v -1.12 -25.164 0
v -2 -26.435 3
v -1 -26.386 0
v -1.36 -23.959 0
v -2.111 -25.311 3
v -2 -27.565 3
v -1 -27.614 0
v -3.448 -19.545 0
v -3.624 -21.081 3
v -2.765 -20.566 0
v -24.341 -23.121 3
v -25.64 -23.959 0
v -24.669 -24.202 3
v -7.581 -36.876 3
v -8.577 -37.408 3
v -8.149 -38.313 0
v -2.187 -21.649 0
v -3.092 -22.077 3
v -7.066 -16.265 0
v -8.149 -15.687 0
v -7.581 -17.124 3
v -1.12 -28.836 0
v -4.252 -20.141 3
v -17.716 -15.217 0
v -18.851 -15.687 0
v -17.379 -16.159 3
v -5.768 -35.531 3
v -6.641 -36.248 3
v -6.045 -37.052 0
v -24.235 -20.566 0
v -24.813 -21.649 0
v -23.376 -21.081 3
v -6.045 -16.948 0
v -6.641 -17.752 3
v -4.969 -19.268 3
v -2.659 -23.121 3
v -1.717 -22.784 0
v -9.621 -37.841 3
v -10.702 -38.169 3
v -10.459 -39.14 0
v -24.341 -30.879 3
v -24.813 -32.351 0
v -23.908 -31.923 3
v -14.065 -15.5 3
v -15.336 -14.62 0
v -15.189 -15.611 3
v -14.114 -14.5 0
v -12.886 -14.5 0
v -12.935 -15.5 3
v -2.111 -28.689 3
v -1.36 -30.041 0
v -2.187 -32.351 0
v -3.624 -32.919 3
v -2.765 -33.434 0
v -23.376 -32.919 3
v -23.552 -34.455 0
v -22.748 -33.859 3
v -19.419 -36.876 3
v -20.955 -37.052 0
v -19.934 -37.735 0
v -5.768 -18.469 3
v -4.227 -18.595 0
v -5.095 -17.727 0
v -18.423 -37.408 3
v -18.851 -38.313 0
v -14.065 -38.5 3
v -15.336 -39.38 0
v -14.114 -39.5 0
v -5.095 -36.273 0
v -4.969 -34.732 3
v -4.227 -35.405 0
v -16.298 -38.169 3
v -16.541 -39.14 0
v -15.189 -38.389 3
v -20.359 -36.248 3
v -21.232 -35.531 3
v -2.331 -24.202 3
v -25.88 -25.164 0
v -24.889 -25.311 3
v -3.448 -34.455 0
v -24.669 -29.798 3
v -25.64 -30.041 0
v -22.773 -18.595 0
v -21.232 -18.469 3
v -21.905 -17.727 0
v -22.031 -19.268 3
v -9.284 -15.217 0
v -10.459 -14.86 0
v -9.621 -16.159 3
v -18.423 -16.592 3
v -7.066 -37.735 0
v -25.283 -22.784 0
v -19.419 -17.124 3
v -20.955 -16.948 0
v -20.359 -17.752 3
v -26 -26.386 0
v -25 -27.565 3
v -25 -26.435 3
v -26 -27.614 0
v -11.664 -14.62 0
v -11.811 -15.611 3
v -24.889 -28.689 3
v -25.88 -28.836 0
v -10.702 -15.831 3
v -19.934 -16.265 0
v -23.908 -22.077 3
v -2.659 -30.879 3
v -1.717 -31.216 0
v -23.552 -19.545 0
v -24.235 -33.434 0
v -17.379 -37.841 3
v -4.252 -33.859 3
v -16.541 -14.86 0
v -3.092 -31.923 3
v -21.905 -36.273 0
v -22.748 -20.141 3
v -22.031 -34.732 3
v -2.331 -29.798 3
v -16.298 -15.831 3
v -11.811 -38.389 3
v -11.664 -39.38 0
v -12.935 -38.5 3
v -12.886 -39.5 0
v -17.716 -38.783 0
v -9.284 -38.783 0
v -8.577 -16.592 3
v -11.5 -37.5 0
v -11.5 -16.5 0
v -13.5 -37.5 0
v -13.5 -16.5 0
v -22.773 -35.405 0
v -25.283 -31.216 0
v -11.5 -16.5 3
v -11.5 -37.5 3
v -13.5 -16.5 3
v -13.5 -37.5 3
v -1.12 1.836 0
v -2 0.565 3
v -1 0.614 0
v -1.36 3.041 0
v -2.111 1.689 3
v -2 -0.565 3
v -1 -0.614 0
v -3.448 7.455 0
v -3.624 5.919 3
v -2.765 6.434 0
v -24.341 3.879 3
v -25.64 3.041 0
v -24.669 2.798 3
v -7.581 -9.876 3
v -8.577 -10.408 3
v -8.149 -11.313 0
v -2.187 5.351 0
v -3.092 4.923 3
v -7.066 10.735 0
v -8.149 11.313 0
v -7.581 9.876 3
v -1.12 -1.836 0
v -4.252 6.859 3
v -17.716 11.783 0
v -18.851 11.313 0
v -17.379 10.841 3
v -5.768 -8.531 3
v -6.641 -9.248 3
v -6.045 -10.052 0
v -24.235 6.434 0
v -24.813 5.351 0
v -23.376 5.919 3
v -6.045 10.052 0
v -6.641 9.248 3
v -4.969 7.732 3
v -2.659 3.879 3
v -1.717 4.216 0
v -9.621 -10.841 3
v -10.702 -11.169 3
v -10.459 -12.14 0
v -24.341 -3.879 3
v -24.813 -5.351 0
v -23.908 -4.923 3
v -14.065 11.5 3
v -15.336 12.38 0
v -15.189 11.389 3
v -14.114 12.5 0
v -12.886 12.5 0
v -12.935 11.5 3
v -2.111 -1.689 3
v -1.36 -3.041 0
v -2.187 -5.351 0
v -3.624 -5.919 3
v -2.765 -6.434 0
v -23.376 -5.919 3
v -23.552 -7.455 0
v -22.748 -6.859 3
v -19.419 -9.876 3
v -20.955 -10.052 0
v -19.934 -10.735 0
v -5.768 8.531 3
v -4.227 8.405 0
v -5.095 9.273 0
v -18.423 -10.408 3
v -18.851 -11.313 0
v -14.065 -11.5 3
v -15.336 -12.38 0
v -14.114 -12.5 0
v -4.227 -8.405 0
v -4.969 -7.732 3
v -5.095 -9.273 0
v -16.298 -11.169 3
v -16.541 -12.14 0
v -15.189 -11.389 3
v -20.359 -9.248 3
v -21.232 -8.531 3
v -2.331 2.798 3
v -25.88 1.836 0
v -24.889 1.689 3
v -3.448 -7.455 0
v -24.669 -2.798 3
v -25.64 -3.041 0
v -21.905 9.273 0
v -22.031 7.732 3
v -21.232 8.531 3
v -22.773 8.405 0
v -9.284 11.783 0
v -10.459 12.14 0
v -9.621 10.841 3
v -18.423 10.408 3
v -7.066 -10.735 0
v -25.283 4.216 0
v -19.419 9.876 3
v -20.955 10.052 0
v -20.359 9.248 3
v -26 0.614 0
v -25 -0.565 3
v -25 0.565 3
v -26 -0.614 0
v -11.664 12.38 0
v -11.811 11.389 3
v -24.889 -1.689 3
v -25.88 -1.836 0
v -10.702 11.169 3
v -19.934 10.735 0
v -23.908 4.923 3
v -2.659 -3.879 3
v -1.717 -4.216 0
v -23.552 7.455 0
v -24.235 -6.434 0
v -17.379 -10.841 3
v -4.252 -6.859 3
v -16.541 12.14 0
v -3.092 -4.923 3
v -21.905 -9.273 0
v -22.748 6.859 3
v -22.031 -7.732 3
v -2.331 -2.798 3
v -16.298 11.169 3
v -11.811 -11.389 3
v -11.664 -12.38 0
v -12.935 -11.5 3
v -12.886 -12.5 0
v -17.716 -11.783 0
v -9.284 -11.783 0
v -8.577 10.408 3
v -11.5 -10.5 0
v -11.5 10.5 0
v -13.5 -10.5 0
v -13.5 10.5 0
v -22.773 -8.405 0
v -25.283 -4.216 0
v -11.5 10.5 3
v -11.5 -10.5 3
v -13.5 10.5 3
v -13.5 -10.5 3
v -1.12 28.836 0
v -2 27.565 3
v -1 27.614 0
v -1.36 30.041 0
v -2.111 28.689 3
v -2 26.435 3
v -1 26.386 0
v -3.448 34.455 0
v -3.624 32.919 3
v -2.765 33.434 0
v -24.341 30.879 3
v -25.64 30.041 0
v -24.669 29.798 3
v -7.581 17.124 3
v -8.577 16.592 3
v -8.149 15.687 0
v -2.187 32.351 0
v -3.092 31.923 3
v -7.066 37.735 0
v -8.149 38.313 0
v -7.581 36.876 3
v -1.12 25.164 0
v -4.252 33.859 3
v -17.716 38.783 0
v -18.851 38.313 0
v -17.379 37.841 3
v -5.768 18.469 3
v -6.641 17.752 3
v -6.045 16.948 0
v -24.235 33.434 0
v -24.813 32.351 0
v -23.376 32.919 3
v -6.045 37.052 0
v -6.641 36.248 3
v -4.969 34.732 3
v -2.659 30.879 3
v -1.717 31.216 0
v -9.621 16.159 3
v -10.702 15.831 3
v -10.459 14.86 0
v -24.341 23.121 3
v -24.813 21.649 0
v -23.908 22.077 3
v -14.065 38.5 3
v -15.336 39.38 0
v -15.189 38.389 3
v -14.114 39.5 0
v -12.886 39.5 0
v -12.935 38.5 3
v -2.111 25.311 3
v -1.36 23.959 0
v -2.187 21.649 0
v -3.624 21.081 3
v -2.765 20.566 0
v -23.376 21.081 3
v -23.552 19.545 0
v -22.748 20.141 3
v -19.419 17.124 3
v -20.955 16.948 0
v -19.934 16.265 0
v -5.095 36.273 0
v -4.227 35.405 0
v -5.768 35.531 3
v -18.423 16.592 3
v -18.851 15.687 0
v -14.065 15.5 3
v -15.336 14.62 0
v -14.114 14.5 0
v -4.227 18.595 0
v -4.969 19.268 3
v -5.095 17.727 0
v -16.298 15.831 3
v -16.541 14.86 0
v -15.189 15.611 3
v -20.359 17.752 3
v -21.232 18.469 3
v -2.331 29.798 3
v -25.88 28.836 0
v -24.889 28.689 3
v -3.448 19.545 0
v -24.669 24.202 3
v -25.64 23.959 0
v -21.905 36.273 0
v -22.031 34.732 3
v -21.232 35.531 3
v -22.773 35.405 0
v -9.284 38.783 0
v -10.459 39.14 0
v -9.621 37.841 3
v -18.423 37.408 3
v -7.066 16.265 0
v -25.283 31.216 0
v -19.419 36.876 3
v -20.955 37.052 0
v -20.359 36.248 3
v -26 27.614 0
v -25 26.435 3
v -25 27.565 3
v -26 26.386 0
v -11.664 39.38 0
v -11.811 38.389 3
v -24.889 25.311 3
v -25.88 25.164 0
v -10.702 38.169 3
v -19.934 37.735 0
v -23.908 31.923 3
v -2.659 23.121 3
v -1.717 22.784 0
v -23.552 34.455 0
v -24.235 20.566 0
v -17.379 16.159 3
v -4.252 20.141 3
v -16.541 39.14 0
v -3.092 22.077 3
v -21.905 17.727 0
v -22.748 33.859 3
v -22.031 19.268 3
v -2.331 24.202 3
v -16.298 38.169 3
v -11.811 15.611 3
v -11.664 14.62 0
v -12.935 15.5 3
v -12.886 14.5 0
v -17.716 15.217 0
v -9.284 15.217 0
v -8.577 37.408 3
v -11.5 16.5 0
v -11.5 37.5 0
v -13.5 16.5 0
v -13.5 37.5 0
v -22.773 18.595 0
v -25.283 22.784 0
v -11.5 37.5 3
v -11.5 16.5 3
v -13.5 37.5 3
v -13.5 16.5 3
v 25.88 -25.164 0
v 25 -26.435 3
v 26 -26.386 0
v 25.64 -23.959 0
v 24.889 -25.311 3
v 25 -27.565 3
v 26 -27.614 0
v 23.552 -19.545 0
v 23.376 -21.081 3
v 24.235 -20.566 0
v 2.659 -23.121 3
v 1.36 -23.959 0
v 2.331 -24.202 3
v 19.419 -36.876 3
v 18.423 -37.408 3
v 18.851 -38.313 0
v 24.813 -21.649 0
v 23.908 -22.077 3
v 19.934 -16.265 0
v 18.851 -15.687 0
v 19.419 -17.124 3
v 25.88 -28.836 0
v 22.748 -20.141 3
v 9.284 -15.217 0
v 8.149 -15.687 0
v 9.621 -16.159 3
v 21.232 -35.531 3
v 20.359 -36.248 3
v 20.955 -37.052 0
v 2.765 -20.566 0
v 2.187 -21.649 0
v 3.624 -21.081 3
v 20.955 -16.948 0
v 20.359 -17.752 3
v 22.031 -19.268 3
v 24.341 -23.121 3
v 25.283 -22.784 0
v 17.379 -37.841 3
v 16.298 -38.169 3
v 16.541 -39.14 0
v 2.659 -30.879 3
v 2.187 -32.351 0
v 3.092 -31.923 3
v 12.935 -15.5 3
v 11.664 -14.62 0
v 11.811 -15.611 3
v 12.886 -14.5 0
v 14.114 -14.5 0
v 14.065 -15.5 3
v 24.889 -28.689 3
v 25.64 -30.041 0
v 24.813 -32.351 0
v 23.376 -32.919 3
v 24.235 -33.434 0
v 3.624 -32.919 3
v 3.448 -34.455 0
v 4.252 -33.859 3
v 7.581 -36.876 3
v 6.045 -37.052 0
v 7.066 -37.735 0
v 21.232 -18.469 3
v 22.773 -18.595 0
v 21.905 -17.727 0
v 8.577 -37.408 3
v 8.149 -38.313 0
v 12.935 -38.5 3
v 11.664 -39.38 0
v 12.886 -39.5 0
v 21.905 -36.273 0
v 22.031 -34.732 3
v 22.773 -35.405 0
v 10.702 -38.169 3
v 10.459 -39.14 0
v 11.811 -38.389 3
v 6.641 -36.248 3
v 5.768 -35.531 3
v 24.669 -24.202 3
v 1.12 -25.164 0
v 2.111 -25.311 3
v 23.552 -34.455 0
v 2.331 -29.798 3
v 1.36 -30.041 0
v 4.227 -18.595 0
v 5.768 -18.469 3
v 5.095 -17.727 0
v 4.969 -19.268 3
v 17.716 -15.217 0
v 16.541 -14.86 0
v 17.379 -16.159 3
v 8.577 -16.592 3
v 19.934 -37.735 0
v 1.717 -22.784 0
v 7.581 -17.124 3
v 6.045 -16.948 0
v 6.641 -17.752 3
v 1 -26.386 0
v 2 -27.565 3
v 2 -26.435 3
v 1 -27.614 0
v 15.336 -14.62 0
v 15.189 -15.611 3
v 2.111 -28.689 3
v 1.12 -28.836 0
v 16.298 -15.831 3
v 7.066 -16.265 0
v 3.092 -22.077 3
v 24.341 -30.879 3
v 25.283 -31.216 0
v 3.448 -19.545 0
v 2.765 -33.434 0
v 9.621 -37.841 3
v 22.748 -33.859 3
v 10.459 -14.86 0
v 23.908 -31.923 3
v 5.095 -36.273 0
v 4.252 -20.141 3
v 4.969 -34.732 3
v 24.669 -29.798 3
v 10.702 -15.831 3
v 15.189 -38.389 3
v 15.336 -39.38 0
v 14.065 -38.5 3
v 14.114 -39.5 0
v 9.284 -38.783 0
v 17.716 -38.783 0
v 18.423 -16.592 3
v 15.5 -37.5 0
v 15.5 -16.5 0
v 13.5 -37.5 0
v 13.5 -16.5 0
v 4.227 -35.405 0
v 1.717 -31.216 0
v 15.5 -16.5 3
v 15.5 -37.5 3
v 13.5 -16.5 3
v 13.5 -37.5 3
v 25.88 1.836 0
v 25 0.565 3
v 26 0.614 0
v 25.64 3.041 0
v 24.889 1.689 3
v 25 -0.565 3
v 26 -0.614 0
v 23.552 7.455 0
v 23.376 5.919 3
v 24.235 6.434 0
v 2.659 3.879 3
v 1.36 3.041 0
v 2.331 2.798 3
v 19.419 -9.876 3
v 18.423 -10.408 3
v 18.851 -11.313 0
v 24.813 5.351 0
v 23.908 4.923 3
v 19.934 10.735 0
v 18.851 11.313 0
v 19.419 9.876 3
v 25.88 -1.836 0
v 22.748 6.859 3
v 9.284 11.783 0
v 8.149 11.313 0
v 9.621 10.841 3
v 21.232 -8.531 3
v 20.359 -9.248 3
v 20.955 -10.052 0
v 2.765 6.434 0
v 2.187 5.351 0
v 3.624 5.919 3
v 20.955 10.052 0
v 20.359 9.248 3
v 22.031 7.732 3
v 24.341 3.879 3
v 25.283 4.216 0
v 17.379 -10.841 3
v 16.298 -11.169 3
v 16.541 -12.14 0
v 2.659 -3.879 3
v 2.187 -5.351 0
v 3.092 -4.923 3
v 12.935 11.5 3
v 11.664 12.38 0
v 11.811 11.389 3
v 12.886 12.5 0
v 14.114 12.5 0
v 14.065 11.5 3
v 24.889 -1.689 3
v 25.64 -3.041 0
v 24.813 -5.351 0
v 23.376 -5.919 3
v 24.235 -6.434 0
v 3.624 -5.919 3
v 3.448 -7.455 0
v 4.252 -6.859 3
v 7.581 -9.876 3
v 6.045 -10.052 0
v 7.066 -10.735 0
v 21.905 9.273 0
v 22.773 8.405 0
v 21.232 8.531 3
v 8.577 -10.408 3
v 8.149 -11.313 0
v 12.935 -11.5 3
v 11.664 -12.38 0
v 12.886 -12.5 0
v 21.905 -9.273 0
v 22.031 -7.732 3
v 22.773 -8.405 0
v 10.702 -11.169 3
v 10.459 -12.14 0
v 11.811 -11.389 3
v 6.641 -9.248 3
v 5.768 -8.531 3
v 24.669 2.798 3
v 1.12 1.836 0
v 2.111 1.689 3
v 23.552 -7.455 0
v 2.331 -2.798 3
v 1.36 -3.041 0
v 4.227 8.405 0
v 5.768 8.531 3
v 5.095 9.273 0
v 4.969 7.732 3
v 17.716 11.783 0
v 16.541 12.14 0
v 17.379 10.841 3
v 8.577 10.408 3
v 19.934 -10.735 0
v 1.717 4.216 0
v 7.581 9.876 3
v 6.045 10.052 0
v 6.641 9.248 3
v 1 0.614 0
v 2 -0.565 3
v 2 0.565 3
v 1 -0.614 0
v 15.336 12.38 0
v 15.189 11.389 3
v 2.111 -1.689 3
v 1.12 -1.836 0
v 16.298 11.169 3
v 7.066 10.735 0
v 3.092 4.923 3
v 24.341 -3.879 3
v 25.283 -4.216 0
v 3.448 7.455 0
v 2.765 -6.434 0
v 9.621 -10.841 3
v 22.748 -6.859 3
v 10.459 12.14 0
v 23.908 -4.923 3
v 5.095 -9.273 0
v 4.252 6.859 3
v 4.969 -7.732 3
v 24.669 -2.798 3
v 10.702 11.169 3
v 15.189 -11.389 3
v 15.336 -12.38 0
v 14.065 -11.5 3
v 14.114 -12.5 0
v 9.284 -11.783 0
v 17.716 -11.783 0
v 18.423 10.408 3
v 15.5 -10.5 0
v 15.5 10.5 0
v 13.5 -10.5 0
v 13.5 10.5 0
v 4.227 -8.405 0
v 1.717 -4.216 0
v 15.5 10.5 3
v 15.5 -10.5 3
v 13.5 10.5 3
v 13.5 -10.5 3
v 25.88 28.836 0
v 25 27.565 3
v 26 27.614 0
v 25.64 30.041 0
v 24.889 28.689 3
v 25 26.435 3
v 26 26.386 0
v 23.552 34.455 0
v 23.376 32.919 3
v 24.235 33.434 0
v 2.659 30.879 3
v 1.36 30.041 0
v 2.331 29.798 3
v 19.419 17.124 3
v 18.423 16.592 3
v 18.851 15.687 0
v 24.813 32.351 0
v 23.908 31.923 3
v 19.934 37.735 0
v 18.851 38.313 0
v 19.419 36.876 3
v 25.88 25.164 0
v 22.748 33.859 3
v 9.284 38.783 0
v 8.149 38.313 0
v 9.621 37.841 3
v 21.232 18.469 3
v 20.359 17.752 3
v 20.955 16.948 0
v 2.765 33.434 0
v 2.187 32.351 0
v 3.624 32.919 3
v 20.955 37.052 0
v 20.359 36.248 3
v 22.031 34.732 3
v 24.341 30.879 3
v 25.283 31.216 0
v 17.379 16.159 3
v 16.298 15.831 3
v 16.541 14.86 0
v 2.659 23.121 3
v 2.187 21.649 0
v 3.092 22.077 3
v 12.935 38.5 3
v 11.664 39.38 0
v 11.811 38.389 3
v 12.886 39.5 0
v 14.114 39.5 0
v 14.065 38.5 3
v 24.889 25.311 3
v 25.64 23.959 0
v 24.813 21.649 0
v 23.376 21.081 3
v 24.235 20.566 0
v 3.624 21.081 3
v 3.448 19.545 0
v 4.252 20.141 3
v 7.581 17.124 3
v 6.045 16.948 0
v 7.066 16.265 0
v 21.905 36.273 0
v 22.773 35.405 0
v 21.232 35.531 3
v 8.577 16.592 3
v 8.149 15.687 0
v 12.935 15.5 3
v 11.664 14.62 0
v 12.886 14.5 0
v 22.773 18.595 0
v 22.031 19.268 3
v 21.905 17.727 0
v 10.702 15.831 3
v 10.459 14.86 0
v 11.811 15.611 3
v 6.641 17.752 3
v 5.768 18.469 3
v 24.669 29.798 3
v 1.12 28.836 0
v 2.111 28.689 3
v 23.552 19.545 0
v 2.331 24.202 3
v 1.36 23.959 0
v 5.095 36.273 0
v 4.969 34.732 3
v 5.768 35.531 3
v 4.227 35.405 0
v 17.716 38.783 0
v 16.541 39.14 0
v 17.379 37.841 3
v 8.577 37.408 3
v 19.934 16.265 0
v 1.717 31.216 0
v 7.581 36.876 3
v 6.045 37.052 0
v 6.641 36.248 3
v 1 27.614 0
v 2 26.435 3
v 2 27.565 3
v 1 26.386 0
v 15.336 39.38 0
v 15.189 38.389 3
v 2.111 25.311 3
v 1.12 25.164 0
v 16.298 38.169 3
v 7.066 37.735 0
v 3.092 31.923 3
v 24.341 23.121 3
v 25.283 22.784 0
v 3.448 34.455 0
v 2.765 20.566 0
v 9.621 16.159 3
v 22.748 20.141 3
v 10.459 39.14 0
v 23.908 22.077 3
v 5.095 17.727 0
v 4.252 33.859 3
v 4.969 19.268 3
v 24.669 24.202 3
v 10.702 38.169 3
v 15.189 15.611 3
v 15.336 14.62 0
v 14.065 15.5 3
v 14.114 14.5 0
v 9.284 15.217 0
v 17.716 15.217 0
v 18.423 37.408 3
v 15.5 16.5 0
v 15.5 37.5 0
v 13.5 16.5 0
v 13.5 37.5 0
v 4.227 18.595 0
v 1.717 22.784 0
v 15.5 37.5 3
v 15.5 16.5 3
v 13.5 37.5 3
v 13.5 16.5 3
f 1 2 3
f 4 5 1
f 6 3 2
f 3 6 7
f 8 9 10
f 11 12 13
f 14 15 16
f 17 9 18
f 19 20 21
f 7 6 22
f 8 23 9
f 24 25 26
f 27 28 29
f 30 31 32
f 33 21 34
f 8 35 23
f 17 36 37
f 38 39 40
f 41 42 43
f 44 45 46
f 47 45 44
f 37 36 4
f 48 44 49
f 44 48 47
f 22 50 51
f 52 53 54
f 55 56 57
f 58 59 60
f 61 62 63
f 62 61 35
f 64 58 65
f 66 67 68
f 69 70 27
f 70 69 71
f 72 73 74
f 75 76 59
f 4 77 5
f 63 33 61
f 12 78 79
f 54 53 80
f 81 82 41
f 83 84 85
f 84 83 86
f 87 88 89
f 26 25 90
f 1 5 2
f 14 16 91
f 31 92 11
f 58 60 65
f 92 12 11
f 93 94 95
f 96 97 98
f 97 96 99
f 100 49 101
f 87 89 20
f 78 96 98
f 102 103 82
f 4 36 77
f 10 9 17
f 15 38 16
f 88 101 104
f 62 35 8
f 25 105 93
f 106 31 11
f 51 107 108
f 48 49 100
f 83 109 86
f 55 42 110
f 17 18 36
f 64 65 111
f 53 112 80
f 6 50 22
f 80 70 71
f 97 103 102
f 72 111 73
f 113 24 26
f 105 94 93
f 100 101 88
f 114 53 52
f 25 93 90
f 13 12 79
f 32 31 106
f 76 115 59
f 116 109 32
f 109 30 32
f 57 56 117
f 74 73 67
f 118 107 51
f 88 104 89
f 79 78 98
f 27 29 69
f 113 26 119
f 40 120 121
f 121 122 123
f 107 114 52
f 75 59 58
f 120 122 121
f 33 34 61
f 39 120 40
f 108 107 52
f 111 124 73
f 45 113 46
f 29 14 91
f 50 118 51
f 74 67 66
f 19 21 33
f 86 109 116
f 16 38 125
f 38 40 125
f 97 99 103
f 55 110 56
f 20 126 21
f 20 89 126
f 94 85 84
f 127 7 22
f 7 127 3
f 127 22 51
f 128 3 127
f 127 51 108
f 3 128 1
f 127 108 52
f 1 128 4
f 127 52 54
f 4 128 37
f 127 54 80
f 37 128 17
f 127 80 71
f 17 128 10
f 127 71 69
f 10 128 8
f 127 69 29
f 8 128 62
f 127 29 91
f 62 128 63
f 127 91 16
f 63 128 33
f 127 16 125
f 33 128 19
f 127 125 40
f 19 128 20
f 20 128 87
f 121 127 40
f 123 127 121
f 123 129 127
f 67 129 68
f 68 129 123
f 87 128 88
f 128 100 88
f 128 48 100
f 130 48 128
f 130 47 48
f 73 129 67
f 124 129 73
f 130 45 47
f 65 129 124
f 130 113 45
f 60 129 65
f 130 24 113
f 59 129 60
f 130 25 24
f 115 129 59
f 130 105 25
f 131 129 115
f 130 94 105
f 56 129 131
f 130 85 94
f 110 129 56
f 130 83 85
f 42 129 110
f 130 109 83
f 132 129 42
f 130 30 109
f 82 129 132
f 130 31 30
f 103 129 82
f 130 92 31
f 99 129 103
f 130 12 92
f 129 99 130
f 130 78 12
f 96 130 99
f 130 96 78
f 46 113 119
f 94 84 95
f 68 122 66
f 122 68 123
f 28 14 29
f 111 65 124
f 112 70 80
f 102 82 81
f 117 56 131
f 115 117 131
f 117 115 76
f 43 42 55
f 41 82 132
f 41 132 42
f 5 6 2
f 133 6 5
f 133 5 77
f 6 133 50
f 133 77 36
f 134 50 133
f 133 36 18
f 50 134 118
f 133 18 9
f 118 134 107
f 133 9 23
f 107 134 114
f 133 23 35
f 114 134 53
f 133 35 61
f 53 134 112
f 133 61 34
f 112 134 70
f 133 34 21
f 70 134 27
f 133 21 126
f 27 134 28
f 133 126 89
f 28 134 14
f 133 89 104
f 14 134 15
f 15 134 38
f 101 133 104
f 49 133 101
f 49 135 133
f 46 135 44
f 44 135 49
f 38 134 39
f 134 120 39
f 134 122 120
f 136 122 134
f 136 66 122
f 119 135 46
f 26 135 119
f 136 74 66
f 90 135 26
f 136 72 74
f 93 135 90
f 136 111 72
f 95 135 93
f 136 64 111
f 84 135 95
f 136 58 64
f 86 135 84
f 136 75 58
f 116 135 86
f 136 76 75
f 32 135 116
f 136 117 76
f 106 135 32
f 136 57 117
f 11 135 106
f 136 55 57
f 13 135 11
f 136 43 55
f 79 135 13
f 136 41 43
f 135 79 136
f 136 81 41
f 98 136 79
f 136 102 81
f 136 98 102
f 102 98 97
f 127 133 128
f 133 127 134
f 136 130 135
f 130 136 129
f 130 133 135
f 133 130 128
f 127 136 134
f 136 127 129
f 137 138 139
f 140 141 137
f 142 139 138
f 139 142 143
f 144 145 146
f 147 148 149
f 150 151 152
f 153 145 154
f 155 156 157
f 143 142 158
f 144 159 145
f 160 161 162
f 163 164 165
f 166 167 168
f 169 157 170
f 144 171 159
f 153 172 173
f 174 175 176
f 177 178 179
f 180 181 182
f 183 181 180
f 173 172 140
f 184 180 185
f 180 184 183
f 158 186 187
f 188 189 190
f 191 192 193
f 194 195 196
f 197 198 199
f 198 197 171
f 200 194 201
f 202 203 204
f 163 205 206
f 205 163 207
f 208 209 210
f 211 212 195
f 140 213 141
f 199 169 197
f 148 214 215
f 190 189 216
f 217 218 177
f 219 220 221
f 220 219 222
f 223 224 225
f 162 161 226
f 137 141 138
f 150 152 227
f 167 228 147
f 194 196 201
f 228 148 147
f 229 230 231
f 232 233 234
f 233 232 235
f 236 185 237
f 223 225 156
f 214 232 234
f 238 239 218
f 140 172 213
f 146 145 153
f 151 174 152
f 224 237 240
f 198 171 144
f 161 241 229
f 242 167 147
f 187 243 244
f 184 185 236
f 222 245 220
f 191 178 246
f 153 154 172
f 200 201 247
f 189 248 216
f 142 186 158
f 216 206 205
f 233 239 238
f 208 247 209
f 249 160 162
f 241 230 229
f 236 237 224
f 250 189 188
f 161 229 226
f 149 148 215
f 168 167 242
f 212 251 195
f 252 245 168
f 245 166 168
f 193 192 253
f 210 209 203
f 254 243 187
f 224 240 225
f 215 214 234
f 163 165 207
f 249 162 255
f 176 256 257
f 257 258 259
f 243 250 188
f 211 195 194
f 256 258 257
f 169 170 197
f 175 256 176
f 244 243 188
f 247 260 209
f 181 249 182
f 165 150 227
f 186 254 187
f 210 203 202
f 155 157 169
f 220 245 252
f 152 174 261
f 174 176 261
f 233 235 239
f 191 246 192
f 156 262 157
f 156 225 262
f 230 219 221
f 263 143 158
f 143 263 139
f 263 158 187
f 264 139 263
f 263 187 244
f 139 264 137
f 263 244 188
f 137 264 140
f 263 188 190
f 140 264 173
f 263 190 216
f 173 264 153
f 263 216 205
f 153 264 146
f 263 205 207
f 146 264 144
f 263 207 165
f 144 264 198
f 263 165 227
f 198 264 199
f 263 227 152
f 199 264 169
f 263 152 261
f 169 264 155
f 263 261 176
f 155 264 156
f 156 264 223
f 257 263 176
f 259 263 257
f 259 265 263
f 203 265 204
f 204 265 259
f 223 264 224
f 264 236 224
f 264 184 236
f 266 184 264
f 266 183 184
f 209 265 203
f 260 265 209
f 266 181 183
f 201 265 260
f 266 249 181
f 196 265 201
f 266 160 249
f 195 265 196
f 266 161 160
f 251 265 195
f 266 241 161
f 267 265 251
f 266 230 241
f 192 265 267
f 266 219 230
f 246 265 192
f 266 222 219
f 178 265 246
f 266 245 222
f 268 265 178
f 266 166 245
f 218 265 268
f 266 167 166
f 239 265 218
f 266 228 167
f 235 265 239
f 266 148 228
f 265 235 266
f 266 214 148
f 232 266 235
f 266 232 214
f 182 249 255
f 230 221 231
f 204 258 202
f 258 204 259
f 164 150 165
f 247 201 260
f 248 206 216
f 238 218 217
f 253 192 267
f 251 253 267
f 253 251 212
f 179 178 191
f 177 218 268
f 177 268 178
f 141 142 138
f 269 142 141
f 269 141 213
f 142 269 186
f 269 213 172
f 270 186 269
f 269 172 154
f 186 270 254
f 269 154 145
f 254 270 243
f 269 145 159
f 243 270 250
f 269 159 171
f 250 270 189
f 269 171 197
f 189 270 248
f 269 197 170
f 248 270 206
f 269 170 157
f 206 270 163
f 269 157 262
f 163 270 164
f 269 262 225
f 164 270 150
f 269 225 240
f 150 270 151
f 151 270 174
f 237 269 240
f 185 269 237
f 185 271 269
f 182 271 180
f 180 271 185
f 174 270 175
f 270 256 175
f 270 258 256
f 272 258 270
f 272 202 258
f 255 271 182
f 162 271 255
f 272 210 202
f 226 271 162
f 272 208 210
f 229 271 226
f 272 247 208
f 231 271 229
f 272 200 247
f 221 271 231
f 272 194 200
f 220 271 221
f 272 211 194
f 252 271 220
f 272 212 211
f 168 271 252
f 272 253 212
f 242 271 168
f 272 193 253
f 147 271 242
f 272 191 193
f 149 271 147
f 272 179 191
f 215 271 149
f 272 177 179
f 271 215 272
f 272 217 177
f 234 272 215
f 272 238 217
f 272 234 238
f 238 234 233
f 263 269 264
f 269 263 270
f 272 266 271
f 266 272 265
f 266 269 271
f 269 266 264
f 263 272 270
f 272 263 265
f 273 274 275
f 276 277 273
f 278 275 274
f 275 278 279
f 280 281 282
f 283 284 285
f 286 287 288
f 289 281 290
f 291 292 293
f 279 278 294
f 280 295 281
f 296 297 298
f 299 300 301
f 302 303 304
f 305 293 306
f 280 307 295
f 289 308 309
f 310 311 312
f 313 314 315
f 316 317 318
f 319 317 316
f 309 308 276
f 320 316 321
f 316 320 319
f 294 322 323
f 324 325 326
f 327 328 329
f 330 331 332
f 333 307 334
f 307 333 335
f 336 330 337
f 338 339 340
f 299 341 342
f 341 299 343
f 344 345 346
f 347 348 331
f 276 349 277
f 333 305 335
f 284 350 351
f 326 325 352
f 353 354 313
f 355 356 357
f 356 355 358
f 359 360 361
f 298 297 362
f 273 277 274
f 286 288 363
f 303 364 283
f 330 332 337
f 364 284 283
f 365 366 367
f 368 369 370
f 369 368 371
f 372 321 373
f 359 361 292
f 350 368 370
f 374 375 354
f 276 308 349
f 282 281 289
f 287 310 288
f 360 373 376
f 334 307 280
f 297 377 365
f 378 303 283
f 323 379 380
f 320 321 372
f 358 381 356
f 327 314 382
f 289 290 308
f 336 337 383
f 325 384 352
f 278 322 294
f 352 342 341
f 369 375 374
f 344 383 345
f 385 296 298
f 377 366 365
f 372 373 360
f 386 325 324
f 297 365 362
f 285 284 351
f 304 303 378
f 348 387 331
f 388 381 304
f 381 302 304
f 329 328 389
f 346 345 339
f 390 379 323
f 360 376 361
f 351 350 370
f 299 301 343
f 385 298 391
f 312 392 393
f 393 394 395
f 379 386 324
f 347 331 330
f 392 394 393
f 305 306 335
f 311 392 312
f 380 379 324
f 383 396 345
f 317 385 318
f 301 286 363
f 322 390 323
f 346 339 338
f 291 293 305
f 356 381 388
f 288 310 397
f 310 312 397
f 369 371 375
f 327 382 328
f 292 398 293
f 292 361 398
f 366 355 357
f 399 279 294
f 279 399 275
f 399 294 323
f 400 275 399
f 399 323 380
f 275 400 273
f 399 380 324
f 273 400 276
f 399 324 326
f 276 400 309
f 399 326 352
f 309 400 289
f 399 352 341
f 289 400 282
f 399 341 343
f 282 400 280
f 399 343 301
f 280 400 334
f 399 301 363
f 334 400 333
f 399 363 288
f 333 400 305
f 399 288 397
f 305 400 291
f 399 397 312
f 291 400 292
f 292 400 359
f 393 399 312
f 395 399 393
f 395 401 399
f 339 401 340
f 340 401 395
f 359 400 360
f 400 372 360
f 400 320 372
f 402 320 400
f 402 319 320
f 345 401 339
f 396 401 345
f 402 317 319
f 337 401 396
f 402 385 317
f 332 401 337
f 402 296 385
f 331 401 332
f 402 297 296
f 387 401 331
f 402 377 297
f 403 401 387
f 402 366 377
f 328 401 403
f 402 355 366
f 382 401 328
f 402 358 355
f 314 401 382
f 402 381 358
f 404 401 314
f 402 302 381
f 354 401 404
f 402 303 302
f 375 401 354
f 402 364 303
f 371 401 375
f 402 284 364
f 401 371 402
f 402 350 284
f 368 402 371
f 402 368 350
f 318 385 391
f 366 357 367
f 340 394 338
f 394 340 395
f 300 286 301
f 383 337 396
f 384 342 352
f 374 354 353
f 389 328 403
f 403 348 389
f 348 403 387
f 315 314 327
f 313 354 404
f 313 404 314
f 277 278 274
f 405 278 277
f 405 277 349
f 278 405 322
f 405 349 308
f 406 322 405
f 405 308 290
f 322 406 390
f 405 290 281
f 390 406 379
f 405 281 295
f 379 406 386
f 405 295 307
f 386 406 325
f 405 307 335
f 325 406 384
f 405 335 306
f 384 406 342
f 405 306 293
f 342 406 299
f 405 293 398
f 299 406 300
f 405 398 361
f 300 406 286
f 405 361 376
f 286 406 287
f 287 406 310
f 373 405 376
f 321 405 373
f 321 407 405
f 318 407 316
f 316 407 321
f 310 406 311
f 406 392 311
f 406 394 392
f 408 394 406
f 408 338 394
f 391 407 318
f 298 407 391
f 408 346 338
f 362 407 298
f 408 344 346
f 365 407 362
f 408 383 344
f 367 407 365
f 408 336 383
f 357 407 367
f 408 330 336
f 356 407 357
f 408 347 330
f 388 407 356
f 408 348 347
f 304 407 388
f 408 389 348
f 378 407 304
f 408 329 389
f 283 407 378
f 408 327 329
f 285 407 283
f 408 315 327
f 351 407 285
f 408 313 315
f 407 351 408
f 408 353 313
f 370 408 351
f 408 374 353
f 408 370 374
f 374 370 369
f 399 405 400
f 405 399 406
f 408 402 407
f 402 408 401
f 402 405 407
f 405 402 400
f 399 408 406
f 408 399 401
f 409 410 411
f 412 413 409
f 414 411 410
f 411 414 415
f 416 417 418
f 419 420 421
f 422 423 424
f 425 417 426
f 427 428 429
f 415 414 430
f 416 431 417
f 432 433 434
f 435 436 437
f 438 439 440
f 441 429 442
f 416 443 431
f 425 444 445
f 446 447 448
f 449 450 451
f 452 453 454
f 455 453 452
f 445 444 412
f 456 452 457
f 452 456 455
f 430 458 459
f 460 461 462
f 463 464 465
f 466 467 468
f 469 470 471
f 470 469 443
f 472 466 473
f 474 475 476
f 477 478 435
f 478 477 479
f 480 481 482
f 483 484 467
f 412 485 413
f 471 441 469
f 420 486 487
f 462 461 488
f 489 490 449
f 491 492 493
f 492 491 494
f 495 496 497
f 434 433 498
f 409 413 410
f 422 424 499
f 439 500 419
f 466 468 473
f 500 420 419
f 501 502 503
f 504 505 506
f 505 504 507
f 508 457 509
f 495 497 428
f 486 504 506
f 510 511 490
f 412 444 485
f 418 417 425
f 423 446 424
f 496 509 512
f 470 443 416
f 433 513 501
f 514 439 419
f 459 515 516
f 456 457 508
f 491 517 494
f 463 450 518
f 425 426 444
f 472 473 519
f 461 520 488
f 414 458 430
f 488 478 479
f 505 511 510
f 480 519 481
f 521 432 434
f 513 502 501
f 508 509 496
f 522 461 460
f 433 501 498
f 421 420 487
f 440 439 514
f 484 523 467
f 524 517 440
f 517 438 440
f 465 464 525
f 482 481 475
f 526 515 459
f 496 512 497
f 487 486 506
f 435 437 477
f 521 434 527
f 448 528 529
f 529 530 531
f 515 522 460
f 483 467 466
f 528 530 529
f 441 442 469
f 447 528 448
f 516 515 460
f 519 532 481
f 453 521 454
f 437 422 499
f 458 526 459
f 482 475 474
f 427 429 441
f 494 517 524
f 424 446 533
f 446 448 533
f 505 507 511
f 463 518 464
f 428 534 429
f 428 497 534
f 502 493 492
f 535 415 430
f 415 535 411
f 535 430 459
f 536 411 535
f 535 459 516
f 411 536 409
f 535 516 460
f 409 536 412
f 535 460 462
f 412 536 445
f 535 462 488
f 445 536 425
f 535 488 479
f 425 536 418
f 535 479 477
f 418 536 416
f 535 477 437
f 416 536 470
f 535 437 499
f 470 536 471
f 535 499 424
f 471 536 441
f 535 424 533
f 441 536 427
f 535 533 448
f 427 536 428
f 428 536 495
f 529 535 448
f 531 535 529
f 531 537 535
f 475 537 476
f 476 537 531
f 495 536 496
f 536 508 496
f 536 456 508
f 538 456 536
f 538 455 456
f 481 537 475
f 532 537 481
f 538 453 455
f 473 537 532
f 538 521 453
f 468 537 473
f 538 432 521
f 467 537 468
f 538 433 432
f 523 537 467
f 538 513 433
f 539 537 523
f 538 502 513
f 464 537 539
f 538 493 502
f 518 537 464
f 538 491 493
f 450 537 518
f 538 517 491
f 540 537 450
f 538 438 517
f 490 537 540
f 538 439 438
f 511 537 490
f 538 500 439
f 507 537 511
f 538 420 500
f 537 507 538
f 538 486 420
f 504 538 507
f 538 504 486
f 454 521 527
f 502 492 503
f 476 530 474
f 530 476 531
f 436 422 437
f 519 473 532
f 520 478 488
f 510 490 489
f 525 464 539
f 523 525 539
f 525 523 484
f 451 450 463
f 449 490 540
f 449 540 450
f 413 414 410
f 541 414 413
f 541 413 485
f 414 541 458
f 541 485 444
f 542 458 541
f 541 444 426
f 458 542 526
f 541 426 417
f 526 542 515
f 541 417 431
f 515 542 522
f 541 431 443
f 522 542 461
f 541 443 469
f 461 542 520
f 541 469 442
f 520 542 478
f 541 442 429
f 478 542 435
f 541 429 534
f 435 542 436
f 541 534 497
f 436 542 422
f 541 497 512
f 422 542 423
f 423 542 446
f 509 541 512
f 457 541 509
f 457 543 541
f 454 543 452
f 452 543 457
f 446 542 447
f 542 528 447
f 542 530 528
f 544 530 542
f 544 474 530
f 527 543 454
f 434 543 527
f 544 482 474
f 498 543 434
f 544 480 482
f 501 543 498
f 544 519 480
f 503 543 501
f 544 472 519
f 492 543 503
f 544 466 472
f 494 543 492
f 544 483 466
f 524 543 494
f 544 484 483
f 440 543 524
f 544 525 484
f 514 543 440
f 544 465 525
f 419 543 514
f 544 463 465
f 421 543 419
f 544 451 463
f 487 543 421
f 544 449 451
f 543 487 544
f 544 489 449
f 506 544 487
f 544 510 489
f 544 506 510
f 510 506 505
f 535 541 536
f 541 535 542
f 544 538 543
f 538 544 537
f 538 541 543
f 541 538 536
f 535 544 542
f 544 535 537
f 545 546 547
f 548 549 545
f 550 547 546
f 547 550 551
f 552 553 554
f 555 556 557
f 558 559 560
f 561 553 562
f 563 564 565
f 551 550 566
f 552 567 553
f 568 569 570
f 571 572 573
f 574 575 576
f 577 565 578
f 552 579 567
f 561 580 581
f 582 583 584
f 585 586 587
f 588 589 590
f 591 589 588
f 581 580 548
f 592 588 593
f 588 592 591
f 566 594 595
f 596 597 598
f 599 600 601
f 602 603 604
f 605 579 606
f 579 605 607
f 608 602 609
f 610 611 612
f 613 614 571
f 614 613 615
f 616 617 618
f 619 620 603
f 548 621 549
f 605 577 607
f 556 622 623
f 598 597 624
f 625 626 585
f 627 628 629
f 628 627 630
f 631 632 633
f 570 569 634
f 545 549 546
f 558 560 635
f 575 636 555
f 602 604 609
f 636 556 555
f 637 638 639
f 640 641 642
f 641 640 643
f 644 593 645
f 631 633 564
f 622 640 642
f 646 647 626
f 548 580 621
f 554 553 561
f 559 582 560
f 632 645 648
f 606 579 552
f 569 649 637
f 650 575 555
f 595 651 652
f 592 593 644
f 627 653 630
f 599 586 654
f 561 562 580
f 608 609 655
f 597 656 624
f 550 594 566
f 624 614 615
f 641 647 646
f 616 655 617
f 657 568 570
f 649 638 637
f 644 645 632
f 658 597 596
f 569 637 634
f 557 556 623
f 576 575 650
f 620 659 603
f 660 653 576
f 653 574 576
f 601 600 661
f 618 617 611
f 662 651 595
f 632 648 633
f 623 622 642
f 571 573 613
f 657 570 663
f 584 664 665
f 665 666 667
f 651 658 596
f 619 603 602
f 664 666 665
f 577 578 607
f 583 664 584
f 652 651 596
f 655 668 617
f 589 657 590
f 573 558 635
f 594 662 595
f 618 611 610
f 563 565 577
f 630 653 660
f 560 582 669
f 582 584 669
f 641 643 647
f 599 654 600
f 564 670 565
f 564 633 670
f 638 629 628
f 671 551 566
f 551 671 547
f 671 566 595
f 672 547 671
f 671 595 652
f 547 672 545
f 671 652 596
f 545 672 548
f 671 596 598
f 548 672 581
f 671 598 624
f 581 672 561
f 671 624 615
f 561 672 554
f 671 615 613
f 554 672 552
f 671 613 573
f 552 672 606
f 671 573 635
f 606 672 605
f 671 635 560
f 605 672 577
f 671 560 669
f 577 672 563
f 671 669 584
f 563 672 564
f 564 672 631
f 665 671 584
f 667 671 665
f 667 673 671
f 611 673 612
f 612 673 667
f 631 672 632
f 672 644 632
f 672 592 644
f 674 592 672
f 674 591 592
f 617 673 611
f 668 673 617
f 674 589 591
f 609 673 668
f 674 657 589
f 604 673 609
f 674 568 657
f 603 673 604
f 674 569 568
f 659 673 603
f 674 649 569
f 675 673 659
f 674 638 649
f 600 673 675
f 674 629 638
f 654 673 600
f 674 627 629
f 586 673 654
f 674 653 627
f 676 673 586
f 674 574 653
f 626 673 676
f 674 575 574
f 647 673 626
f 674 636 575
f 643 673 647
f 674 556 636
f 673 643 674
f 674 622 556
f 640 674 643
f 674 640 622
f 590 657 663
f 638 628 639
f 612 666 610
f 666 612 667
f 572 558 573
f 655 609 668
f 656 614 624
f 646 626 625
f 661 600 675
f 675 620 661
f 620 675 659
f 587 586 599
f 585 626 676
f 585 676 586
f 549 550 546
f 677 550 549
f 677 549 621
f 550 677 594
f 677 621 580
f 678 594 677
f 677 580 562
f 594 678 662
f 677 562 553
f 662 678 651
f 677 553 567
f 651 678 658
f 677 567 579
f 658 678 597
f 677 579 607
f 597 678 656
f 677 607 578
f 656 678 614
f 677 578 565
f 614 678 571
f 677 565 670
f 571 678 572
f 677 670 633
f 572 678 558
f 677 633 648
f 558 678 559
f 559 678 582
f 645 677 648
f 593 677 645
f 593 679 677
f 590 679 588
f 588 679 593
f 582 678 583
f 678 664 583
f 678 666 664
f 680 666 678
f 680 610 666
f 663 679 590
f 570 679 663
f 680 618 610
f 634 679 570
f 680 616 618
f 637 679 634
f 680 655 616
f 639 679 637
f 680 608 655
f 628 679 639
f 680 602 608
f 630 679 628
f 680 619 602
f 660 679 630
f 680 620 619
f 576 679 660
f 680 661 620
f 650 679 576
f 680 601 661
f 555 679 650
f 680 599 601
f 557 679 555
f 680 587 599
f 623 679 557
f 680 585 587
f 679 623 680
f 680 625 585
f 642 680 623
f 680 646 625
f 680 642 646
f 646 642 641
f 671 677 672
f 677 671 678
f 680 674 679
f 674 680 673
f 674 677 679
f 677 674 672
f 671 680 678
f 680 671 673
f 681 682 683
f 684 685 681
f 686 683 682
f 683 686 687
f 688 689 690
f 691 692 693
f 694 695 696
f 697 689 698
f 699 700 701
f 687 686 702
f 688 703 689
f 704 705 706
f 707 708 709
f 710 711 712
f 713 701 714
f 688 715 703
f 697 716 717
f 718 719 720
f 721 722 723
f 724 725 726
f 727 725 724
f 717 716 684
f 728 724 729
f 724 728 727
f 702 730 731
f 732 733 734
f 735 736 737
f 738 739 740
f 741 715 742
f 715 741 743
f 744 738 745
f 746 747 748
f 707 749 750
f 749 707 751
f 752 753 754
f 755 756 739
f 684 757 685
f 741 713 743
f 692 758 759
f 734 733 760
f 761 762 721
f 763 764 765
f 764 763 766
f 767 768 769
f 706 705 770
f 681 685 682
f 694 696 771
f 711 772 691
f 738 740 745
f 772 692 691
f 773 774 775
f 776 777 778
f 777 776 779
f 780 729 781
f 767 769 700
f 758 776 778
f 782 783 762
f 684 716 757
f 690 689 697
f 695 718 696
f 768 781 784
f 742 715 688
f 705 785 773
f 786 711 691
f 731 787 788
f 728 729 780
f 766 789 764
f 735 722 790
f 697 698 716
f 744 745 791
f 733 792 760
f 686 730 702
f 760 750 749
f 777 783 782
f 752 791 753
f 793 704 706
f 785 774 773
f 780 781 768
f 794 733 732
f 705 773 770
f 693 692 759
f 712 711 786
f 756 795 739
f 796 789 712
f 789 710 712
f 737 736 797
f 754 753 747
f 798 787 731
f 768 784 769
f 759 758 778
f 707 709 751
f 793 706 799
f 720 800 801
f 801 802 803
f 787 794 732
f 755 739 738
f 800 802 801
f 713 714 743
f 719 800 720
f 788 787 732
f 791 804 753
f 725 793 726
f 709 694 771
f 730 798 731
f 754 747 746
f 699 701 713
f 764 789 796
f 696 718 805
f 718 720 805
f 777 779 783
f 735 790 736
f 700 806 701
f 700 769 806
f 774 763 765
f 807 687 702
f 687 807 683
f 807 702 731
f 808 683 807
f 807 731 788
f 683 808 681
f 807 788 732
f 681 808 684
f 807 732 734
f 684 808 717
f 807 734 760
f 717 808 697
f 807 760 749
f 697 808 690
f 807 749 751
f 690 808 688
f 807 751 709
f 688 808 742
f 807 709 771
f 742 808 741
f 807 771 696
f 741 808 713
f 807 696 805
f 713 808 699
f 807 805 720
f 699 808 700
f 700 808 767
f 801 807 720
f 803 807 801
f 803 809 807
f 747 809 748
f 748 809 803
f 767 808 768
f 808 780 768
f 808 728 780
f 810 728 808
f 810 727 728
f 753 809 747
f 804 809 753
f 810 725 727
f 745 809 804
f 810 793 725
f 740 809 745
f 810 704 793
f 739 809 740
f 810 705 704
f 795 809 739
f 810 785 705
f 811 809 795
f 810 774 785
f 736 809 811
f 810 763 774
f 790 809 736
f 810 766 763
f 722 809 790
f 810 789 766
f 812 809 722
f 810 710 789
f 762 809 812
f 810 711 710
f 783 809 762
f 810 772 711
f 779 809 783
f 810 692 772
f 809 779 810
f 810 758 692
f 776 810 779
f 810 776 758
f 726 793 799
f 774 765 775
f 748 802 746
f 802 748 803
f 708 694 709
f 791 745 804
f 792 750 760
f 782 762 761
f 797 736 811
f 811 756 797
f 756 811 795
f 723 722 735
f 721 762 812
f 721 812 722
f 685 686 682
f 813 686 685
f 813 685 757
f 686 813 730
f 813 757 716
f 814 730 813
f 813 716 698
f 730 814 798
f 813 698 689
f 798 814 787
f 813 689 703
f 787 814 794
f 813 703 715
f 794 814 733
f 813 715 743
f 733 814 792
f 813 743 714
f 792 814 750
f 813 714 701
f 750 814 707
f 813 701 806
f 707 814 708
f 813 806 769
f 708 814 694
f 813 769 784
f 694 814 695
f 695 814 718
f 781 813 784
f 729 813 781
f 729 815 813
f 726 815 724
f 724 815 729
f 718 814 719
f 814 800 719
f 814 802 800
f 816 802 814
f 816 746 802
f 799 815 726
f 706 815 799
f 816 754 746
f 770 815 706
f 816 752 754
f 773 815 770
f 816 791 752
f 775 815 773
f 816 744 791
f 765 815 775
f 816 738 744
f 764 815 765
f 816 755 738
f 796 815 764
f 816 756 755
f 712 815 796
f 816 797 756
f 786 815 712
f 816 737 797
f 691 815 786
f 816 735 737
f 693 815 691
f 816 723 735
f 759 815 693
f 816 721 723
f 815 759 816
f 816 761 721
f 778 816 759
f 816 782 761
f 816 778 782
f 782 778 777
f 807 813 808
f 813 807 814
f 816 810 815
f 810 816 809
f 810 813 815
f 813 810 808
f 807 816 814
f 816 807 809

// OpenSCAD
// [FL_INDEX: keywords="openscad, 3d_parametric, Parametric_minature_base, csg_solid" | COT="Parametric OpenSCAD design from 3DCodeverse"]
// Title: Parametric minature base

// base v1_1
// GPLv2
// (c) 2012 TakeItAndRun
//
// v1_0: clean up code
// v1_1: make it work with customizer
// 
//

//*******************************************************
//
// basic definitions
//
//*******************************************************


// circle have $fn facets
$fn=+30;

// small displacement to avoid parallel faces with zero volume
e=+0.02;

// unit vectors
xaxis=[1,0,0];
yaxis=[0,1,0];
zaxis=[0,0,1];

//*******************************************************
//
// dimensions
//
//*******************************************************

/* [base] */
// form of base
rbfn=64;//[4:square,8:octagonal,64:round]
// diameter of the base (for square bases this is the width)
db=25;//[10:100]
// hexagonal and oktogonal a little less in width)
rb=db/2;
// width of the edge (in 1/10 units)
e=10;//[0:20]
edge=e/10;
// to calculate upper radius of the base
rb1=rb-edge;
// height of the base
hb=3;//[1:10]
/* [slit] */
// slit
slit=1;//[0:no slit,1:with slit]
// width of the slit
sx=2;//[1:10]
// offset of the slit off the center
dsx=1;//[0:10]
// length of the slit
sl=2*rb-2*edge-2;
/* [print] */
// distance between bases on the print bed
dxprint=2;//[1:10]
// number of bases in x-direction
nx=2;//[1:10]
// number of bases in y-direction
ny=3;//[1:10]

//*******************************************************
//
// routines
//
//*******************************************************

// base with n corners, set n=rbnf for a round base
module base(n,slit=1){
	difference(){
		rotate(180/n)cylinder(hb,rb/cos(180/n),rb1/cos(180/n),$fn=n);
		if(slit==1)mslit();
	}
}

// make a cubus for the slit to be cut from the base
module mslit(){
	translate(dsx*xaxis+(hb)/2*zaxis)cube([sx,sl,hb+2*e],true);
}

module printbase(n=4,slit=1,nx=5,ny=5){
	for(i=[-(nx-1)/2:(nx-1)/2])
	for(j=[-(ny-1)/2:(ny-1)/2])
		translate((dxprint+2*rb)*(i*xaxis+j*yaxis))base(n,slit);
}

// print a sampling of bases
module samplebase(){
	translate(0*(dxprint+2*rb)*yaxis)base(n=4,slit=1);
	translate(3*(dxprint+2*rb)*yaxis)rotate(30)base(n=6,slit=1);
	translate(2*(dxprint+2*rb)*yaxis)base(n=8,slit=1);
	translate(1*(dxprint+2*rb)*yaxis)base(n=rbfn,slit=1);
	translate(4*(dxprint+2*rb)*yaxis)difference(){
		rotate(30)base(n=6,slit=0);
		mslit();
	}
	
	translate(1*(dxprint+2*rb)*xaxis){
	translate(0*(dxprint+2*rb)*yaxis)base(n=4,slit=0);
	translate((3*(dxprint+2*rb)+rb)*yaxis)rotate(30)base(n=6,slit=0);
	translate(2*(dxprint+2*rb)*yaxis)base(n=8,slit=0);
	translate(1*(dxprint+2*rb)*yaxis)base(n=rbfn,slit=0);
	}
}


//*******************************************************
//
// main program
//
//*******************************************************

// one single base
// n=4 		makes it square, with r being half the diameter
// n=8 		oktogonal(sp?)
// n=rbfn 	round

//base(n=4,slit=0);

// print a sampling of bases
// color("lime")samplebase();

// print lots of bases all at once
//printbase(n=rbfn,slit=1);
printbase(n=rbfn,slit=slit,nx=nx,ny=ny);
